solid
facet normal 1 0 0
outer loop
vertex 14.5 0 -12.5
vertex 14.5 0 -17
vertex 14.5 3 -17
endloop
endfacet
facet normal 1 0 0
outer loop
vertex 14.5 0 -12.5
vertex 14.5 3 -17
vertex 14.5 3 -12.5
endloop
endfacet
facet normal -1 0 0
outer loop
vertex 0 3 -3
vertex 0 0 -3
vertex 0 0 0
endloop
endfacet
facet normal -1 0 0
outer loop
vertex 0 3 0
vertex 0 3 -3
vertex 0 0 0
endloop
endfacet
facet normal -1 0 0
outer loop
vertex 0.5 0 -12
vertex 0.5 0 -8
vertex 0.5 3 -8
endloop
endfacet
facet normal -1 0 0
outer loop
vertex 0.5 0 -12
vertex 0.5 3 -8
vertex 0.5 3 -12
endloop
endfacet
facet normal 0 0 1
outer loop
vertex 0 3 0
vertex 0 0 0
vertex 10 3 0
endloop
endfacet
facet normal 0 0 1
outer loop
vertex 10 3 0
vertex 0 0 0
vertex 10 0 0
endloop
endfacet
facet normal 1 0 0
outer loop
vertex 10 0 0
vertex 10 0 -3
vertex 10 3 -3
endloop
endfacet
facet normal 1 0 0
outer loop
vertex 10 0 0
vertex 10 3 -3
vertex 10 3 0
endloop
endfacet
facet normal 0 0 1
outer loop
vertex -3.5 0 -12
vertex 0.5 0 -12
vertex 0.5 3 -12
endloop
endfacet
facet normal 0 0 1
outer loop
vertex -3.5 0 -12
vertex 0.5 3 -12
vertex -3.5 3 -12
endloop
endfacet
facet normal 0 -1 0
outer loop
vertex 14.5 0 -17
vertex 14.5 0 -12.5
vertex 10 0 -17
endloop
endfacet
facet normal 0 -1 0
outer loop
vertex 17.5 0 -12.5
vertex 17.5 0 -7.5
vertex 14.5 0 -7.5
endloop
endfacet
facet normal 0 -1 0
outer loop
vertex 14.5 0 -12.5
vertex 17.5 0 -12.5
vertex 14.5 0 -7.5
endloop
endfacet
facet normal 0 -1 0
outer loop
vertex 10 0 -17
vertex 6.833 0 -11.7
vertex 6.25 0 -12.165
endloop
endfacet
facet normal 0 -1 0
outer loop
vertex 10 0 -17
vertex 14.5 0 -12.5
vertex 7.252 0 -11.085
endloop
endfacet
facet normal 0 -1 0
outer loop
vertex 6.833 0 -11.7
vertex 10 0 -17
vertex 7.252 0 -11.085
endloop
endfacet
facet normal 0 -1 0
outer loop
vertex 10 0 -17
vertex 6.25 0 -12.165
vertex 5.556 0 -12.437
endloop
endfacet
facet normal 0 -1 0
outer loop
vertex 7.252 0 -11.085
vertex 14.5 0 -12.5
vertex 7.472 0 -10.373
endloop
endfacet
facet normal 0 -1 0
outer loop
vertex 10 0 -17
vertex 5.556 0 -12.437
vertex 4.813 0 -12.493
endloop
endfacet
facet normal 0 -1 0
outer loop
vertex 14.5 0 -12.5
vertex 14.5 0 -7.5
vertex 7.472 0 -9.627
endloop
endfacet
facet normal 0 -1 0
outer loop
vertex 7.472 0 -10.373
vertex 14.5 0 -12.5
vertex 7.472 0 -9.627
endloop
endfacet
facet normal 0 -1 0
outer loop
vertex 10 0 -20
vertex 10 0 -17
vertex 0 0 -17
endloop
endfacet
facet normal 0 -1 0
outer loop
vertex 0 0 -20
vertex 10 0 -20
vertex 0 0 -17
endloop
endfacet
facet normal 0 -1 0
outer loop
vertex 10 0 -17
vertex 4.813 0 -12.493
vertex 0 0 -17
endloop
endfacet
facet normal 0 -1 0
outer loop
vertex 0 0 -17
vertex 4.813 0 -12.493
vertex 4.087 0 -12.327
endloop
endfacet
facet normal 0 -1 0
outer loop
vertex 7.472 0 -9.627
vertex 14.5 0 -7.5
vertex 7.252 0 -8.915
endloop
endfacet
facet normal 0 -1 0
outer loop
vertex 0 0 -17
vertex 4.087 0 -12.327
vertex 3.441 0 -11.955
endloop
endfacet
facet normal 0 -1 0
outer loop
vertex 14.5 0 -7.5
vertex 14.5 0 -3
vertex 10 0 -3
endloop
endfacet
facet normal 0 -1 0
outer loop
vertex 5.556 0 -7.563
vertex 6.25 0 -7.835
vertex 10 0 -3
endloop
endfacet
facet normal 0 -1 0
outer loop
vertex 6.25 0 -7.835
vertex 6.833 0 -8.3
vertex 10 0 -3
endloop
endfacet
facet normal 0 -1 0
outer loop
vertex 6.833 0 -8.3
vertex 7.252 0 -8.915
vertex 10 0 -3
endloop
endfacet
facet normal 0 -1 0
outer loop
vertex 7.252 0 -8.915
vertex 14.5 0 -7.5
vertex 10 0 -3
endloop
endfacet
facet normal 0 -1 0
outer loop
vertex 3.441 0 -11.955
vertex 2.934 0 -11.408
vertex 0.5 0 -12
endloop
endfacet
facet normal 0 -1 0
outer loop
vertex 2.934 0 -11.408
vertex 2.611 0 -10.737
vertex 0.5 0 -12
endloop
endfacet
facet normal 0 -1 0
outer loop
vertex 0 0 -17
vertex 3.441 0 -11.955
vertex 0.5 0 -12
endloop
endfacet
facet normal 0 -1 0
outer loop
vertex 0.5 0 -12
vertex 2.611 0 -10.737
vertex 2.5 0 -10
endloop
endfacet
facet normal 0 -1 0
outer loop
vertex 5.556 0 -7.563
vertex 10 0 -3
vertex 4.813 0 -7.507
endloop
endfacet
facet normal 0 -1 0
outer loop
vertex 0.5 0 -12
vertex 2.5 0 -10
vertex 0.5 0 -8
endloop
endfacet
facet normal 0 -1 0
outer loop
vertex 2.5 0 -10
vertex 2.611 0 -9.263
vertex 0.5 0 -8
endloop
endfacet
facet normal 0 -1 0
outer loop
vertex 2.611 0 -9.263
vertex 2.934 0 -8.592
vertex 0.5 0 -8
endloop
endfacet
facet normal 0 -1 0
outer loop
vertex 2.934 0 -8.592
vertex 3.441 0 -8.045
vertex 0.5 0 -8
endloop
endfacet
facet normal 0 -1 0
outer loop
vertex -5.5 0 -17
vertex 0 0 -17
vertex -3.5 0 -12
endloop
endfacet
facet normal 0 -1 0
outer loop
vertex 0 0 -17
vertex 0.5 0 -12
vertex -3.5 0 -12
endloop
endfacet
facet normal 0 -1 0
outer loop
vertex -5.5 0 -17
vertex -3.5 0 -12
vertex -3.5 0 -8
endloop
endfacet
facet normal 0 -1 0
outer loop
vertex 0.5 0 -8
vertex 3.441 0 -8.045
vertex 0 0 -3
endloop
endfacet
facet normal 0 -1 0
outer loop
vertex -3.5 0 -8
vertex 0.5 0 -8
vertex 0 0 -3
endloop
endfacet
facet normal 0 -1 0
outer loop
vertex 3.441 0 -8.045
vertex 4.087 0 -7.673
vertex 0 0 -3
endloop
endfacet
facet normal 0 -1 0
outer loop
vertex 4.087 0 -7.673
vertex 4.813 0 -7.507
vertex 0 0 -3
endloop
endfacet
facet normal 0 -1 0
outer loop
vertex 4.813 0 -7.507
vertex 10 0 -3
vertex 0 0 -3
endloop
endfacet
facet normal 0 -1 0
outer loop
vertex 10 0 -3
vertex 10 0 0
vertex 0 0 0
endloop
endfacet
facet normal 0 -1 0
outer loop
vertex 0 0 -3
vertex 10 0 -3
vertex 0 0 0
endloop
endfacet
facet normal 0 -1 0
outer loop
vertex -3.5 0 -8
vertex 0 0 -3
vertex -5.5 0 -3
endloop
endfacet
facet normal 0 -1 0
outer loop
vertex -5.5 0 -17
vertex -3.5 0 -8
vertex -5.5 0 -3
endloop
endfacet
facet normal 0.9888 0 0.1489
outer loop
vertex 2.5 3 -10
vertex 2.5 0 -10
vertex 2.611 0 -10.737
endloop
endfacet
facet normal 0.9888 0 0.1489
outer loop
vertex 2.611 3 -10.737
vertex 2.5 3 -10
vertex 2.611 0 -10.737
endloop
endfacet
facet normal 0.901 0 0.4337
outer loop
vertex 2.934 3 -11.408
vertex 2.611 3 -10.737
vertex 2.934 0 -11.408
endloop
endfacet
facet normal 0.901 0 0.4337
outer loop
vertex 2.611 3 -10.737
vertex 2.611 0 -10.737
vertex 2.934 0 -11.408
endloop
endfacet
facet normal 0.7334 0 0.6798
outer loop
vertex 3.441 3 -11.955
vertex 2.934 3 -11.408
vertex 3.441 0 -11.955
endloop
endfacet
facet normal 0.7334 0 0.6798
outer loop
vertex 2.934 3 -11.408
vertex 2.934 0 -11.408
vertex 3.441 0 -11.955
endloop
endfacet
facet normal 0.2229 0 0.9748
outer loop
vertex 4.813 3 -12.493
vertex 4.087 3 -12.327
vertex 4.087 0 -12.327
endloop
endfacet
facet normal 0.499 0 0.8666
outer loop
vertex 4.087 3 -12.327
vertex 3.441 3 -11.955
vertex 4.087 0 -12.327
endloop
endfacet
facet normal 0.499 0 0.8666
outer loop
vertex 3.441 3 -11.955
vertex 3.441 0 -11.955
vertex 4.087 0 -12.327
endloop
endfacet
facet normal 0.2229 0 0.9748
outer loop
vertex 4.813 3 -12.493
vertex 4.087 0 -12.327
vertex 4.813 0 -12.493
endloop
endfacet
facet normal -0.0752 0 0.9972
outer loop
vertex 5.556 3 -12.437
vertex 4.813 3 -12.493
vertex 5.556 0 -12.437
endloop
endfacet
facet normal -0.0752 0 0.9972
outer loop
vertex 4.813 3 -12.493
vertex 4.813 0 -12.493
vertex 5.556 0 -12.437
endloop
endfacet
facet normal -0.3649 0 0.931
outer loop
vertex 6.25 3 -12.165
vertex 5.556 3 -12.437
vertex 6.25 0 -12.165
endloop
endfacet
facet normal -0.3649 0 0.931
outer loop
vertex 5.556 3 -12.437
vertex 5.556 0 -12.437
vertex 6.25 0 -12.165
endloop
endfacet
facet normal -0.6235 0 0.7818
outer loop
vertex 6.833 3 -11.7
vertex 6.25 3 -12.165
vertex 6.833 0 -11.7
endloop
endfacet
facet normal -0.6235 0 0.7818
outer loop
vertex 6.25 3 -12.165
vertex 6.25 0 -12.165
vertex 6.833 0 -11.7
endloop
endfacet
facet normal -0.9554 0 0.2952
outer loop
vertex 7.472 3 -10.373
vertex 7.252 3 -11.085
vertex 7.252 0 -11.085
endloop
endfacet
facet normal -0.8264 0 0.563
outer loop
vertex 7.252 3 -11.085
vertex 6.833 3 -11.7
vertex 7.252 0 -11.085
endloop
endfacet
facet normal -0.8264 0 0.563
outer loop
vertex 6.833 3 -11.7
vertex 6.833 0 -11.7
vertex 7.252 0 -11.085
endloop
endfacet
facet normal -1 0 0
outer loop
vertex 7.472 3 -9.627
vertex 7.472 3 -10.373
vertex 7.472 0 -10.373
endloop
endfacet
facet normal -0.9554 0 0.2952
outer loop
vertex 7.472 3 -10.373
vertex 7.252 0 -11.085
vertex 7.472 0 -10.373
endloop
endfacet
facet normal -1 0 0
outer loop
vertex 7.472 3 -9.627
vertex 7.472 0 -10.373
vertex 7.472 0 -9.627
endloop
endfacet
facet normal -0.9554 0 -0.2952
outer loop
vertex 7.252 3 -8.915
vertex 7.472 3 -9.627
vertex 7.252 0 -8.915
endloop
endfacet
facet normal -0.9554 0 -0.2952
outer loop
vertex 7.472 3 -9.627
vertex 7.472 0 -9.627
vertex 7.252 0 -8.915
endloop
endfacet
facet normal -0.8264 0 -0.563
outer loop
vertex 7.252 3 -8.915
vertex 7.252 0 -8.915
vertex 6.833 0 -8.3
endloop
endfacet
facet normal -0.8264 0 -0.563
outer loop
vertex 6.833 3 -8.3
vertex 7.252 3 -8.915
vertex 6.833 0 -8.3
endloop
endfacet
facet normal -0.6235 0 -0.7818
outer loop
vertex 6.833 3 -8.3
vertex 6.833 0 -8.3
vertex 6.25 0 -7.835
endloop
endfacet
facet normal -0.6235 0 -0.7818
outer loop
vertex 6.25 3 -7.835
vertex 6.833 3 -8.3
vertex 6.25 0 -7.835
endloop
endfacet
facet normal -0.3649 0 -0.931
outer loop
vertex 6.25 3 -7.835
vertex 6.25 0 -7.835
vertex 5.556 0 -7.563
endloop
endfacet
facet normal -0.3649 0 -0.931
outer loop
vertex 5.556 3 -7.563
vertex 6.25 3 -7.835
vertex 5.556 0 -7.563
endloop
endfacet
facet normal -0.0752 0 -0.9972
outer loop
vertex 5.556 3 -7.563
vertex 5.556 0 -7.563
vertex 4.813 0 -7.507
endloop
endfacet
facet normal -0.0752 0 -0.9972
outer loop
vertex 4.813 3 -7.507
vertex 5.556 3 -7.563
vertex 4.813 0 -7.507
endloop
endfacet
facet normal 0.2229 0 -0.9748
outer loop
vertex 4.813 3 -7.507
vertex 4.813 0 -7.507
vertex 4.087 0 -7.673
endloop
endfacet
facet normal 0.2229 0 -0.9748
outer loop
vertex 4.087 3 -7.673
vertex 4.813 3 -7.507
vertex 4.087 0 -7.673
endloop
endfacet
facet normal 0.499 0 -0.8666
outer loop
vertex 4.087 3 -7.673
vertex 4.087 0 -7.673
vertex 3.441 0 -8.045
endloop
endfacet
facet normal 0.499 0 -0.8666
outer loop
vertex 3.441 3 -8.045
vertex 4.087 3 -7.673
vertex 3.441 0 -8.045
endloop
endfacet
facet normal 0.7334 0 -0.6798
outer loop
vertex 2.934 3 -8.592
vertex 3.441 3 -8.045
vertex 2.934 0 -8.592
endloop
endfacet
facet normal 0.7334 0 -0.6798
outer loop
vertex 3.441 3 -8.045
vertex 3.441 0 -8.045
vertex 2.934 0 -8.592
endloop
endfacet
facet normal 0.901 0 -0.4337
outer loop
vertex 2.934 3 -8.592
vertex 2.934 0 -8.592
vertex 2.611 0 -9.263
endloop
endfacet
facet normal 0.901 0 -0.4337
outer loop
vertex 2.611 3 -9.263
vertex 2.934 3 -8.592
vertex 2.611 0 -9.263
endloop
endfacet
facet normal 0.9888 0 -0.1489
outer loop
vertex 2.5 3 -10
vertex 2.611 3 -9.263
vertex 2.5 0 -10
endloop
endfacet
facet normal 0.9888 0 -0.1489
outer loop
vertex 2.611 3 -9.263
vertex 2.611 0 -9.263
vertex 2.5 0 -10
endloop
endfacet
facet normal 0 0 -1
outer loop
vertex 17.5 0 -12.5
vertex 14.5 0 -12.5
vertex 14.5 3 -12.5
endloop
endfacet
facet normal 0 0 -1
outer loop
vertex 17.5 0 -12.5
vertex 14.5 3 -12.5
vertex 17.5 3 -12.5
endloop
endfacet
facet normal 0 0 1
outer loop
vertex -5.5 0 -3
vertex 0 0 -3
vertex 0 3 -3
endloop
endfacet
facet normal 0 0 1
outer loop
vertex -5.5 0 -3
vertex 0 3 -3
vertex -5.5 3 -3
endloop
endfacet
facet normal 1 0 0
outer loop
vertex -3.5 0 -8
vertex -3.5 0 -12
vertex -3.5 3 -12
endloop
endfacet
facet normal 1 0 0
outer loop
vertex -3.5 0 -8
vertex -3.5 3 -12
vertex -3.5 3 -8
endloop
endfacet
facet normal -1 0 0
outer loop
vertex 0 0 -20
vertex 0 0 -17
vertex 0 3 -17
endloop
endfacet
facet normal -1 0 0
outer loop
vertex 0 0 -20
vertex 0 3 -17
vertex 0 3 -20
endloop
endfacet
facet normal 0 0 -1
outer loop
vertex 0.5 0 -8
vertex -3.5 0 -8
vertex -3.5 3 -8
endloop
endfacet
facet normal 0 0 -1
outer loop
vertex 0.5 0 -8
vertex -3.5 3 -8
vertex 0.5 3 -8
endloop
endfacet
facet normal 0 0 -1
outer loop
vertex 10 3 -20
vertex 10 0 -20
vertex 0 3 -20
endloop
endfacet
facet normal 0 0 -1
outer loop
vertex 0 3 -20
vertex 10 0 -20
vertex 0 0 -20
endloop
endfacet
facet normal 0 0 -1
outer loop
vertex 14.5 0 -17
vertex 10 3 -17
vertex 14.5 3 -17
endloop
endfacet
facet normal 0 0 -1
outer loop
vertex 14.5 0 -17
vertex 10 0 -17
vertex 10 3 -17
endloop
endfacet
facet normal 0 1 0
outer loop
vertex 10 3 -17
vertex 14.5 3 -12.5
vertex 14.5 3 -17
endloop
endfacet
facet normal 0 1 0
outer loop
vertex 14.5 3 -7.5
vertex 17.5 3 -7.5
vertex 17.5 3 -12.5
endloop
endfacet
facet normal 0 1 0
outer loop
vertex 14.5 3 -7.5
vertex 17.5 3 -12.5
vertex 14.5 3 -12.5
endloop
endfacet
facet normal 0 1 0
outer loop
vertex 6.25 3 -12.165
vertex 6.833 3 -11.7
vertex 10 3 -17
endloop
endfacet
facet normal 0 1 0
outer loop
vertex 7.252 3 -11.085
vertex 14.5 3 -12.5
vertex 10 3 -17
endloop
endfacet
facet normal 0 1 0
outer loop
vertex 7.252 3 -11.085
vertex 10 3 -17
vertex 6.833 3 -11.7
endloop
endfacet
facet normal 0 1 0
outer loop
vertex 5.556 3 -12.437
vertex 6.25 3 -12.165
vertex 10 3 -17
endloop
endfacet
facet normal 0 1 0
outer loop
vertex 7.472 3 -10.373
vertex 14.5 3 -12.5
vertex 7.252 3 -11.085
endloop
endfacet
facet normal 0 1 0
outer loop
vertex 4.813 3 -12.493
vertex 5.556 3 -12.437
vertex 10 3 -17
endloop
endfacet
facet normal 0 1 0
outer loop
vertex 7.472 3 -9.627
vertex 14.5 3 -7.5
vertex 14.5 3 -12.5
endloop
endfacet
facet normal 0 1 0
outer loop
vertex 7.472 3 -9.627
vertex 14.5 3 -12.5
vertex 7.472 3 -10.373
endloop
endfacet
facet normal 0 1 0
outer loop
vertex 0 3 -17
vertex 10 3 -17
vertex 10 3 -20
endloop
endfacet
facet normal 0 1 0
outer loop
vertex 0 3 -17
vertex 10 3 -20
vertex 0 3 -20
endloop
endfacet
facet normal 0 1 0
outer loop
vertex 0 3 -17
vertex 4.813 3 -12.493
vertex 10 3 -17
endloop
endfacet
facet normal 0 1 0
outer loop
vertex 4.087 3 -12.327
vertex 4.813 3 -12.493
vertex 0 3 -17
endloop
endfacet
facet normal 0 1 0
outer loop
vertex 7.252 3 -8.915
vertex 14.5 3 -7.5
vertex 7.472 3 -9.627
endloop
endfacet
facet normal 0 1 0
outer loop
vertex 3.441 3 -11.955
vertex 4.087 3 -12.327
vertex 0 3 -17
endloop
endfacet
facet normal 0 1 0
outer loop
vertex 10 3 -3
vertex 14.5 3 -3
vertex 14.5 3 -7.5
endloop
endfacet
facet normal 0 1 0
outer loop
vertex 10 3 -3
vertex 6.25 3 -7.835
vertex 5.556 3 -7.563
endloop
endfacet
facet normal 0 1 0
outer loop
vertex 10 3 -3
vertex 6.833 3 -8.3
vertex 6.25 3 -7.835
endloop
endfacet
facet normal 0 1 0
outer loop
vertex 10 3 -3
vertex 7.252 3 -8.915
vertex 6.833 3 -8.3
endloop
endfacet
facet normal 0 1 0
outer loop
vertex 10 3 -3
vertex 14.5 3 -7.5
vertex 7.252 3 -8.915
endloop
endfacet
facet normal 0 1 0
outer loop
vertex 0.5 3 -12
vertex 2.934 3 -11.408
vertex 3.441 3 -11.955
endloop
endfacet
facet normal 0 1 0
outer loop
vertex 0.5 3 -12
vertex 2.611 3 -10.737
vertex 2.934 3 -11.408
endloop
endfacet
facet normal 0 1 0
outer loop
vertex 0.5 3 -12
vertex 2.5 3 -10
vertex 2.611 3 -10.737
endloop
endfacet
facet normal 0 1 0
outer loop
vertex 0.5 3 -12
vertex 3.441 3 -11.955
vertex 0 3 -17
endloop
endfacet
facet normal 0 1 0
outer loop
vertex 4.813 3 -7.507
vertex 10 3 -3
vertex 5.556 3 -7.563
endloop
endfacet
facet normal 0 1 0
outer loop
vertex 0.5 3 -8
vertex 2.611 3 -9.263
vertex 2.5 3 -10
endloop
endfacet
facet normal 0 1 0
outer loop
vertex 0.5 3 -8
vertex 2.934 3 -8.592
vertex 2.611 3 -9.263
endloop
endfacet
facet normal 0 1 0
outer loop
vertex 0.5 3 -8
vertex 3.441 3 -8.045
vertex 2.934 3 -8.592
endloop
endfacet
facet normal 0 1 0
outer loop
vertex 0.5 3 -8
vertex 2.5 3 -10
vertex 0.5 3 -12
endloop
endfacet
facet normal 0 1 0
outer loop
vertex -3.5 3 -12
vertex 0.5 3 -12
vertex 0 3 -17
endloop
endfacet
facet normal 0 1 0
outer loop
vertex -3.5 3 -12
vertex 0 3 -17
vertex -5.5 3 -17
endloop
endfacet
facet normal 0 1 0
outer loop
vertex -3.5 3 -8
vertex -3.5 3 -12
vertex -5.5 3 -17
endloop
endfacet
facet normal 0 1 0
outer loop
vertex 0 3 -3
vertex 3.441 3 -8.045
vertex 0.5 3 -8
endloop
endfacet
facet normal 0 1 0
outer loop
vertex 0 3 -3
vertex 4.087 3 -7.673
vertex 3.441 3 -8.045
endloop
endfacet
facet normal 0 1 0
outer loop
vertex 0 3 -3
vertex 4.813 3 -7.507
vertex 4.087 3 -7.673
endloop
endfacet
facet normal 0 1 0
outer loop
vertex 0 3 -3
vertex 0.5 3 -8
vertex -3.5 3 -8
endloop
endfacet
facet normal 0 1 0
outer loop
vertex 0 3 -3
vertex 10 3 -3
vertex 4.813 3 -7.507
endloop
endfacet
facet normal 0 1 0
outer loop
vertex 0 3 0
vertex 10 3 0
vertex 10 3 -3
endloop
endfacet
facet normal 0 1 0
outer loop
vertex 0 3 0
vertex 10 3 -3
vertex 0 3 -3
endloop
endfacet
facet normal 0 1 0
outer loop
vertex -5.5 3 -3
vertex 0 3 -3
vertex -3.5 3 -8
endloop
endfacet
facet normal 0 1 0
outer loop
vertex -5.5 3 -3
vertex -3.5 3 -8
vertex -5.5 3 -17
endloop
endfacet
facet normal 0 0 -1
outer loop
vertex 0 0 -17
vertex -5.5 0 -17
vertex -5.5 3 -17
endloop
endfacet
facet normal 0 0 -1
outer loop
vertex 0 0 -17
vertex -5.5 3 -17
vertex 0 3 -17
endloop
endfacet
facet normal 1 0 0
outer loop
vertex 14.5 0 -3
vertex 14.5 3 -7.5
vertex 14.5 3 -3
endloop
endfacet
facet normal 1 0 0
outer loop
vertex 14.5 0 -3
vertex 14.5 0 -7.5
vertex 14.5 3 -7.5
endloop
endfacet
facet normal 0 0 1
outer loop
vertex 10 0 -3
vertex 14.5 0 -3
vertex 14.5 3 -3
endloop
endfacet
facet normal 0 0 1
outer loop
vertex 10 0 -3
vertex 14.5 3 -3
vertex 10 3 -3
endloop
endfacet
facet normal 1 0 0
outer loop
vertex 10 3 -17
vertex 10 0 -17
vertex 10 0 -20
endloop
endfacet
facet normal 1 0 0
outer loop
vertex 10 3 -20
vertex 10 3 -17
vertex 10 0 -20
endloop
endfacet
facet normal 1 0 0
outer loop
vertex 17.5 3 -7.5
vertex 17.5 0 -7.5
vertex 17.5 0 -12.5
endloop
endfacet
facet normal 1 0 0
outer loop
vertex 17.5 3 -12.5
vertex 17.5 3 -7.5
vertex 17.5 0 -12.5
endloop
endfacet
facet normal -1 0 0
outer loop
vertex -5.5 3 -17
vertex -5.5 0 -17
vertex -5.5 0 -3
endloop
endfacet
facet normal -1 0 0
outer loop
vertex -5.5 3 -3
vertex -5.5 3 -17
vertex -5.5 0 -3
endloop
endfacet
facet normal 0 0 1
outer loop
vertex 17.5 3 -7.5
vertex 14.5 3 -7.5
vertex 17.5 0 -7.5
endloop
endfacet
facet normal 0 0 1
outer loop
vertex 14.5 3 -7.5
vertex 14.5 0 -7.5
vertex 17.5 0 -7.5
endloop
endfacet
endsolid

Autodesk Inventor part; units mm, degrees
ref_plane "YZ Plane" through (0, 0, 0) normal (1, 0, 0) x (0, 1, 0)
ref_plane "XZ Plane" through (0, 0, 0) normal (0, 1, 0) x (-1, 0, 0)
ref_plane "XY Plane" through (0, 0, 0) normal (0, 0, 1) x (1, 0, 0)
sketch "Boceto1" plane through (0, 0, 0) normal (0, 1, 0) x (-1, 0, 0)
  line L0 (0, 0) -> (-10, 0)
  line L1 (-17.5, -7.5) -> (-17.5, -12.5)
  line L2 (-10, -20) -> (0, -20)
  line L3 (5.5, -17) -> (5.5, -3)
  line L4 (0, -3) -> (0, 0)
  line L5 (-10, -3) -> (-10, 0)
  line L6 (-14.5, -3) -> (-10, -3)
  line L7 (0, -3) -> (5.5, -3)
  line L8 (0, -17) -> (0, -20)
  line L9 (-10, -17) -> (-10, -20)
  line L10 (5.5, -17) -> (0, -17)
  line L11 (-10, -17) -> (-14.5, -17)
  line L12 (-14.5, -12.5) -> (-17.5, -12.5)
  line L13 (-14.5, -7.5) -> (-17.5, -7.5)
  line L14 (-14.5, -17) -> (-14.5, -12.5)
  line L15 (-14.5, -7.5) -> (-14.5, -3)
  circle A0 centre (-5, -10) radius 2.5
  line L16 (-0.5, -8) -> (-0.5, -12)
  line L17 (-0.5, -12) -> (3.5, -12)
  line L18 (3.5, -12) -> (3.5, -8)
  line L19 (3.5, -8) -> (-0.5, -8)
  point P0 (-17.5, -10)
  point P1 (-5, -20)
  point P2 (-0.5, -10)
  dimension "d0" = 23
  dimension "d1" = 20
  dimension "d4" = 10
  dimension "d6" = 5
  dimension "d7" = 3
  dimension "d8" = 3
  dimension "d10" = 5
  dimension "d13" = 7.5
  dimension "d14" = 4
  dimension "d15" = 4
  dimension "d16" = 2
extrude "Extrusión2" add sketch "Boceto1" along normal blind 3
properties part number "Barilla" material "Oro"
